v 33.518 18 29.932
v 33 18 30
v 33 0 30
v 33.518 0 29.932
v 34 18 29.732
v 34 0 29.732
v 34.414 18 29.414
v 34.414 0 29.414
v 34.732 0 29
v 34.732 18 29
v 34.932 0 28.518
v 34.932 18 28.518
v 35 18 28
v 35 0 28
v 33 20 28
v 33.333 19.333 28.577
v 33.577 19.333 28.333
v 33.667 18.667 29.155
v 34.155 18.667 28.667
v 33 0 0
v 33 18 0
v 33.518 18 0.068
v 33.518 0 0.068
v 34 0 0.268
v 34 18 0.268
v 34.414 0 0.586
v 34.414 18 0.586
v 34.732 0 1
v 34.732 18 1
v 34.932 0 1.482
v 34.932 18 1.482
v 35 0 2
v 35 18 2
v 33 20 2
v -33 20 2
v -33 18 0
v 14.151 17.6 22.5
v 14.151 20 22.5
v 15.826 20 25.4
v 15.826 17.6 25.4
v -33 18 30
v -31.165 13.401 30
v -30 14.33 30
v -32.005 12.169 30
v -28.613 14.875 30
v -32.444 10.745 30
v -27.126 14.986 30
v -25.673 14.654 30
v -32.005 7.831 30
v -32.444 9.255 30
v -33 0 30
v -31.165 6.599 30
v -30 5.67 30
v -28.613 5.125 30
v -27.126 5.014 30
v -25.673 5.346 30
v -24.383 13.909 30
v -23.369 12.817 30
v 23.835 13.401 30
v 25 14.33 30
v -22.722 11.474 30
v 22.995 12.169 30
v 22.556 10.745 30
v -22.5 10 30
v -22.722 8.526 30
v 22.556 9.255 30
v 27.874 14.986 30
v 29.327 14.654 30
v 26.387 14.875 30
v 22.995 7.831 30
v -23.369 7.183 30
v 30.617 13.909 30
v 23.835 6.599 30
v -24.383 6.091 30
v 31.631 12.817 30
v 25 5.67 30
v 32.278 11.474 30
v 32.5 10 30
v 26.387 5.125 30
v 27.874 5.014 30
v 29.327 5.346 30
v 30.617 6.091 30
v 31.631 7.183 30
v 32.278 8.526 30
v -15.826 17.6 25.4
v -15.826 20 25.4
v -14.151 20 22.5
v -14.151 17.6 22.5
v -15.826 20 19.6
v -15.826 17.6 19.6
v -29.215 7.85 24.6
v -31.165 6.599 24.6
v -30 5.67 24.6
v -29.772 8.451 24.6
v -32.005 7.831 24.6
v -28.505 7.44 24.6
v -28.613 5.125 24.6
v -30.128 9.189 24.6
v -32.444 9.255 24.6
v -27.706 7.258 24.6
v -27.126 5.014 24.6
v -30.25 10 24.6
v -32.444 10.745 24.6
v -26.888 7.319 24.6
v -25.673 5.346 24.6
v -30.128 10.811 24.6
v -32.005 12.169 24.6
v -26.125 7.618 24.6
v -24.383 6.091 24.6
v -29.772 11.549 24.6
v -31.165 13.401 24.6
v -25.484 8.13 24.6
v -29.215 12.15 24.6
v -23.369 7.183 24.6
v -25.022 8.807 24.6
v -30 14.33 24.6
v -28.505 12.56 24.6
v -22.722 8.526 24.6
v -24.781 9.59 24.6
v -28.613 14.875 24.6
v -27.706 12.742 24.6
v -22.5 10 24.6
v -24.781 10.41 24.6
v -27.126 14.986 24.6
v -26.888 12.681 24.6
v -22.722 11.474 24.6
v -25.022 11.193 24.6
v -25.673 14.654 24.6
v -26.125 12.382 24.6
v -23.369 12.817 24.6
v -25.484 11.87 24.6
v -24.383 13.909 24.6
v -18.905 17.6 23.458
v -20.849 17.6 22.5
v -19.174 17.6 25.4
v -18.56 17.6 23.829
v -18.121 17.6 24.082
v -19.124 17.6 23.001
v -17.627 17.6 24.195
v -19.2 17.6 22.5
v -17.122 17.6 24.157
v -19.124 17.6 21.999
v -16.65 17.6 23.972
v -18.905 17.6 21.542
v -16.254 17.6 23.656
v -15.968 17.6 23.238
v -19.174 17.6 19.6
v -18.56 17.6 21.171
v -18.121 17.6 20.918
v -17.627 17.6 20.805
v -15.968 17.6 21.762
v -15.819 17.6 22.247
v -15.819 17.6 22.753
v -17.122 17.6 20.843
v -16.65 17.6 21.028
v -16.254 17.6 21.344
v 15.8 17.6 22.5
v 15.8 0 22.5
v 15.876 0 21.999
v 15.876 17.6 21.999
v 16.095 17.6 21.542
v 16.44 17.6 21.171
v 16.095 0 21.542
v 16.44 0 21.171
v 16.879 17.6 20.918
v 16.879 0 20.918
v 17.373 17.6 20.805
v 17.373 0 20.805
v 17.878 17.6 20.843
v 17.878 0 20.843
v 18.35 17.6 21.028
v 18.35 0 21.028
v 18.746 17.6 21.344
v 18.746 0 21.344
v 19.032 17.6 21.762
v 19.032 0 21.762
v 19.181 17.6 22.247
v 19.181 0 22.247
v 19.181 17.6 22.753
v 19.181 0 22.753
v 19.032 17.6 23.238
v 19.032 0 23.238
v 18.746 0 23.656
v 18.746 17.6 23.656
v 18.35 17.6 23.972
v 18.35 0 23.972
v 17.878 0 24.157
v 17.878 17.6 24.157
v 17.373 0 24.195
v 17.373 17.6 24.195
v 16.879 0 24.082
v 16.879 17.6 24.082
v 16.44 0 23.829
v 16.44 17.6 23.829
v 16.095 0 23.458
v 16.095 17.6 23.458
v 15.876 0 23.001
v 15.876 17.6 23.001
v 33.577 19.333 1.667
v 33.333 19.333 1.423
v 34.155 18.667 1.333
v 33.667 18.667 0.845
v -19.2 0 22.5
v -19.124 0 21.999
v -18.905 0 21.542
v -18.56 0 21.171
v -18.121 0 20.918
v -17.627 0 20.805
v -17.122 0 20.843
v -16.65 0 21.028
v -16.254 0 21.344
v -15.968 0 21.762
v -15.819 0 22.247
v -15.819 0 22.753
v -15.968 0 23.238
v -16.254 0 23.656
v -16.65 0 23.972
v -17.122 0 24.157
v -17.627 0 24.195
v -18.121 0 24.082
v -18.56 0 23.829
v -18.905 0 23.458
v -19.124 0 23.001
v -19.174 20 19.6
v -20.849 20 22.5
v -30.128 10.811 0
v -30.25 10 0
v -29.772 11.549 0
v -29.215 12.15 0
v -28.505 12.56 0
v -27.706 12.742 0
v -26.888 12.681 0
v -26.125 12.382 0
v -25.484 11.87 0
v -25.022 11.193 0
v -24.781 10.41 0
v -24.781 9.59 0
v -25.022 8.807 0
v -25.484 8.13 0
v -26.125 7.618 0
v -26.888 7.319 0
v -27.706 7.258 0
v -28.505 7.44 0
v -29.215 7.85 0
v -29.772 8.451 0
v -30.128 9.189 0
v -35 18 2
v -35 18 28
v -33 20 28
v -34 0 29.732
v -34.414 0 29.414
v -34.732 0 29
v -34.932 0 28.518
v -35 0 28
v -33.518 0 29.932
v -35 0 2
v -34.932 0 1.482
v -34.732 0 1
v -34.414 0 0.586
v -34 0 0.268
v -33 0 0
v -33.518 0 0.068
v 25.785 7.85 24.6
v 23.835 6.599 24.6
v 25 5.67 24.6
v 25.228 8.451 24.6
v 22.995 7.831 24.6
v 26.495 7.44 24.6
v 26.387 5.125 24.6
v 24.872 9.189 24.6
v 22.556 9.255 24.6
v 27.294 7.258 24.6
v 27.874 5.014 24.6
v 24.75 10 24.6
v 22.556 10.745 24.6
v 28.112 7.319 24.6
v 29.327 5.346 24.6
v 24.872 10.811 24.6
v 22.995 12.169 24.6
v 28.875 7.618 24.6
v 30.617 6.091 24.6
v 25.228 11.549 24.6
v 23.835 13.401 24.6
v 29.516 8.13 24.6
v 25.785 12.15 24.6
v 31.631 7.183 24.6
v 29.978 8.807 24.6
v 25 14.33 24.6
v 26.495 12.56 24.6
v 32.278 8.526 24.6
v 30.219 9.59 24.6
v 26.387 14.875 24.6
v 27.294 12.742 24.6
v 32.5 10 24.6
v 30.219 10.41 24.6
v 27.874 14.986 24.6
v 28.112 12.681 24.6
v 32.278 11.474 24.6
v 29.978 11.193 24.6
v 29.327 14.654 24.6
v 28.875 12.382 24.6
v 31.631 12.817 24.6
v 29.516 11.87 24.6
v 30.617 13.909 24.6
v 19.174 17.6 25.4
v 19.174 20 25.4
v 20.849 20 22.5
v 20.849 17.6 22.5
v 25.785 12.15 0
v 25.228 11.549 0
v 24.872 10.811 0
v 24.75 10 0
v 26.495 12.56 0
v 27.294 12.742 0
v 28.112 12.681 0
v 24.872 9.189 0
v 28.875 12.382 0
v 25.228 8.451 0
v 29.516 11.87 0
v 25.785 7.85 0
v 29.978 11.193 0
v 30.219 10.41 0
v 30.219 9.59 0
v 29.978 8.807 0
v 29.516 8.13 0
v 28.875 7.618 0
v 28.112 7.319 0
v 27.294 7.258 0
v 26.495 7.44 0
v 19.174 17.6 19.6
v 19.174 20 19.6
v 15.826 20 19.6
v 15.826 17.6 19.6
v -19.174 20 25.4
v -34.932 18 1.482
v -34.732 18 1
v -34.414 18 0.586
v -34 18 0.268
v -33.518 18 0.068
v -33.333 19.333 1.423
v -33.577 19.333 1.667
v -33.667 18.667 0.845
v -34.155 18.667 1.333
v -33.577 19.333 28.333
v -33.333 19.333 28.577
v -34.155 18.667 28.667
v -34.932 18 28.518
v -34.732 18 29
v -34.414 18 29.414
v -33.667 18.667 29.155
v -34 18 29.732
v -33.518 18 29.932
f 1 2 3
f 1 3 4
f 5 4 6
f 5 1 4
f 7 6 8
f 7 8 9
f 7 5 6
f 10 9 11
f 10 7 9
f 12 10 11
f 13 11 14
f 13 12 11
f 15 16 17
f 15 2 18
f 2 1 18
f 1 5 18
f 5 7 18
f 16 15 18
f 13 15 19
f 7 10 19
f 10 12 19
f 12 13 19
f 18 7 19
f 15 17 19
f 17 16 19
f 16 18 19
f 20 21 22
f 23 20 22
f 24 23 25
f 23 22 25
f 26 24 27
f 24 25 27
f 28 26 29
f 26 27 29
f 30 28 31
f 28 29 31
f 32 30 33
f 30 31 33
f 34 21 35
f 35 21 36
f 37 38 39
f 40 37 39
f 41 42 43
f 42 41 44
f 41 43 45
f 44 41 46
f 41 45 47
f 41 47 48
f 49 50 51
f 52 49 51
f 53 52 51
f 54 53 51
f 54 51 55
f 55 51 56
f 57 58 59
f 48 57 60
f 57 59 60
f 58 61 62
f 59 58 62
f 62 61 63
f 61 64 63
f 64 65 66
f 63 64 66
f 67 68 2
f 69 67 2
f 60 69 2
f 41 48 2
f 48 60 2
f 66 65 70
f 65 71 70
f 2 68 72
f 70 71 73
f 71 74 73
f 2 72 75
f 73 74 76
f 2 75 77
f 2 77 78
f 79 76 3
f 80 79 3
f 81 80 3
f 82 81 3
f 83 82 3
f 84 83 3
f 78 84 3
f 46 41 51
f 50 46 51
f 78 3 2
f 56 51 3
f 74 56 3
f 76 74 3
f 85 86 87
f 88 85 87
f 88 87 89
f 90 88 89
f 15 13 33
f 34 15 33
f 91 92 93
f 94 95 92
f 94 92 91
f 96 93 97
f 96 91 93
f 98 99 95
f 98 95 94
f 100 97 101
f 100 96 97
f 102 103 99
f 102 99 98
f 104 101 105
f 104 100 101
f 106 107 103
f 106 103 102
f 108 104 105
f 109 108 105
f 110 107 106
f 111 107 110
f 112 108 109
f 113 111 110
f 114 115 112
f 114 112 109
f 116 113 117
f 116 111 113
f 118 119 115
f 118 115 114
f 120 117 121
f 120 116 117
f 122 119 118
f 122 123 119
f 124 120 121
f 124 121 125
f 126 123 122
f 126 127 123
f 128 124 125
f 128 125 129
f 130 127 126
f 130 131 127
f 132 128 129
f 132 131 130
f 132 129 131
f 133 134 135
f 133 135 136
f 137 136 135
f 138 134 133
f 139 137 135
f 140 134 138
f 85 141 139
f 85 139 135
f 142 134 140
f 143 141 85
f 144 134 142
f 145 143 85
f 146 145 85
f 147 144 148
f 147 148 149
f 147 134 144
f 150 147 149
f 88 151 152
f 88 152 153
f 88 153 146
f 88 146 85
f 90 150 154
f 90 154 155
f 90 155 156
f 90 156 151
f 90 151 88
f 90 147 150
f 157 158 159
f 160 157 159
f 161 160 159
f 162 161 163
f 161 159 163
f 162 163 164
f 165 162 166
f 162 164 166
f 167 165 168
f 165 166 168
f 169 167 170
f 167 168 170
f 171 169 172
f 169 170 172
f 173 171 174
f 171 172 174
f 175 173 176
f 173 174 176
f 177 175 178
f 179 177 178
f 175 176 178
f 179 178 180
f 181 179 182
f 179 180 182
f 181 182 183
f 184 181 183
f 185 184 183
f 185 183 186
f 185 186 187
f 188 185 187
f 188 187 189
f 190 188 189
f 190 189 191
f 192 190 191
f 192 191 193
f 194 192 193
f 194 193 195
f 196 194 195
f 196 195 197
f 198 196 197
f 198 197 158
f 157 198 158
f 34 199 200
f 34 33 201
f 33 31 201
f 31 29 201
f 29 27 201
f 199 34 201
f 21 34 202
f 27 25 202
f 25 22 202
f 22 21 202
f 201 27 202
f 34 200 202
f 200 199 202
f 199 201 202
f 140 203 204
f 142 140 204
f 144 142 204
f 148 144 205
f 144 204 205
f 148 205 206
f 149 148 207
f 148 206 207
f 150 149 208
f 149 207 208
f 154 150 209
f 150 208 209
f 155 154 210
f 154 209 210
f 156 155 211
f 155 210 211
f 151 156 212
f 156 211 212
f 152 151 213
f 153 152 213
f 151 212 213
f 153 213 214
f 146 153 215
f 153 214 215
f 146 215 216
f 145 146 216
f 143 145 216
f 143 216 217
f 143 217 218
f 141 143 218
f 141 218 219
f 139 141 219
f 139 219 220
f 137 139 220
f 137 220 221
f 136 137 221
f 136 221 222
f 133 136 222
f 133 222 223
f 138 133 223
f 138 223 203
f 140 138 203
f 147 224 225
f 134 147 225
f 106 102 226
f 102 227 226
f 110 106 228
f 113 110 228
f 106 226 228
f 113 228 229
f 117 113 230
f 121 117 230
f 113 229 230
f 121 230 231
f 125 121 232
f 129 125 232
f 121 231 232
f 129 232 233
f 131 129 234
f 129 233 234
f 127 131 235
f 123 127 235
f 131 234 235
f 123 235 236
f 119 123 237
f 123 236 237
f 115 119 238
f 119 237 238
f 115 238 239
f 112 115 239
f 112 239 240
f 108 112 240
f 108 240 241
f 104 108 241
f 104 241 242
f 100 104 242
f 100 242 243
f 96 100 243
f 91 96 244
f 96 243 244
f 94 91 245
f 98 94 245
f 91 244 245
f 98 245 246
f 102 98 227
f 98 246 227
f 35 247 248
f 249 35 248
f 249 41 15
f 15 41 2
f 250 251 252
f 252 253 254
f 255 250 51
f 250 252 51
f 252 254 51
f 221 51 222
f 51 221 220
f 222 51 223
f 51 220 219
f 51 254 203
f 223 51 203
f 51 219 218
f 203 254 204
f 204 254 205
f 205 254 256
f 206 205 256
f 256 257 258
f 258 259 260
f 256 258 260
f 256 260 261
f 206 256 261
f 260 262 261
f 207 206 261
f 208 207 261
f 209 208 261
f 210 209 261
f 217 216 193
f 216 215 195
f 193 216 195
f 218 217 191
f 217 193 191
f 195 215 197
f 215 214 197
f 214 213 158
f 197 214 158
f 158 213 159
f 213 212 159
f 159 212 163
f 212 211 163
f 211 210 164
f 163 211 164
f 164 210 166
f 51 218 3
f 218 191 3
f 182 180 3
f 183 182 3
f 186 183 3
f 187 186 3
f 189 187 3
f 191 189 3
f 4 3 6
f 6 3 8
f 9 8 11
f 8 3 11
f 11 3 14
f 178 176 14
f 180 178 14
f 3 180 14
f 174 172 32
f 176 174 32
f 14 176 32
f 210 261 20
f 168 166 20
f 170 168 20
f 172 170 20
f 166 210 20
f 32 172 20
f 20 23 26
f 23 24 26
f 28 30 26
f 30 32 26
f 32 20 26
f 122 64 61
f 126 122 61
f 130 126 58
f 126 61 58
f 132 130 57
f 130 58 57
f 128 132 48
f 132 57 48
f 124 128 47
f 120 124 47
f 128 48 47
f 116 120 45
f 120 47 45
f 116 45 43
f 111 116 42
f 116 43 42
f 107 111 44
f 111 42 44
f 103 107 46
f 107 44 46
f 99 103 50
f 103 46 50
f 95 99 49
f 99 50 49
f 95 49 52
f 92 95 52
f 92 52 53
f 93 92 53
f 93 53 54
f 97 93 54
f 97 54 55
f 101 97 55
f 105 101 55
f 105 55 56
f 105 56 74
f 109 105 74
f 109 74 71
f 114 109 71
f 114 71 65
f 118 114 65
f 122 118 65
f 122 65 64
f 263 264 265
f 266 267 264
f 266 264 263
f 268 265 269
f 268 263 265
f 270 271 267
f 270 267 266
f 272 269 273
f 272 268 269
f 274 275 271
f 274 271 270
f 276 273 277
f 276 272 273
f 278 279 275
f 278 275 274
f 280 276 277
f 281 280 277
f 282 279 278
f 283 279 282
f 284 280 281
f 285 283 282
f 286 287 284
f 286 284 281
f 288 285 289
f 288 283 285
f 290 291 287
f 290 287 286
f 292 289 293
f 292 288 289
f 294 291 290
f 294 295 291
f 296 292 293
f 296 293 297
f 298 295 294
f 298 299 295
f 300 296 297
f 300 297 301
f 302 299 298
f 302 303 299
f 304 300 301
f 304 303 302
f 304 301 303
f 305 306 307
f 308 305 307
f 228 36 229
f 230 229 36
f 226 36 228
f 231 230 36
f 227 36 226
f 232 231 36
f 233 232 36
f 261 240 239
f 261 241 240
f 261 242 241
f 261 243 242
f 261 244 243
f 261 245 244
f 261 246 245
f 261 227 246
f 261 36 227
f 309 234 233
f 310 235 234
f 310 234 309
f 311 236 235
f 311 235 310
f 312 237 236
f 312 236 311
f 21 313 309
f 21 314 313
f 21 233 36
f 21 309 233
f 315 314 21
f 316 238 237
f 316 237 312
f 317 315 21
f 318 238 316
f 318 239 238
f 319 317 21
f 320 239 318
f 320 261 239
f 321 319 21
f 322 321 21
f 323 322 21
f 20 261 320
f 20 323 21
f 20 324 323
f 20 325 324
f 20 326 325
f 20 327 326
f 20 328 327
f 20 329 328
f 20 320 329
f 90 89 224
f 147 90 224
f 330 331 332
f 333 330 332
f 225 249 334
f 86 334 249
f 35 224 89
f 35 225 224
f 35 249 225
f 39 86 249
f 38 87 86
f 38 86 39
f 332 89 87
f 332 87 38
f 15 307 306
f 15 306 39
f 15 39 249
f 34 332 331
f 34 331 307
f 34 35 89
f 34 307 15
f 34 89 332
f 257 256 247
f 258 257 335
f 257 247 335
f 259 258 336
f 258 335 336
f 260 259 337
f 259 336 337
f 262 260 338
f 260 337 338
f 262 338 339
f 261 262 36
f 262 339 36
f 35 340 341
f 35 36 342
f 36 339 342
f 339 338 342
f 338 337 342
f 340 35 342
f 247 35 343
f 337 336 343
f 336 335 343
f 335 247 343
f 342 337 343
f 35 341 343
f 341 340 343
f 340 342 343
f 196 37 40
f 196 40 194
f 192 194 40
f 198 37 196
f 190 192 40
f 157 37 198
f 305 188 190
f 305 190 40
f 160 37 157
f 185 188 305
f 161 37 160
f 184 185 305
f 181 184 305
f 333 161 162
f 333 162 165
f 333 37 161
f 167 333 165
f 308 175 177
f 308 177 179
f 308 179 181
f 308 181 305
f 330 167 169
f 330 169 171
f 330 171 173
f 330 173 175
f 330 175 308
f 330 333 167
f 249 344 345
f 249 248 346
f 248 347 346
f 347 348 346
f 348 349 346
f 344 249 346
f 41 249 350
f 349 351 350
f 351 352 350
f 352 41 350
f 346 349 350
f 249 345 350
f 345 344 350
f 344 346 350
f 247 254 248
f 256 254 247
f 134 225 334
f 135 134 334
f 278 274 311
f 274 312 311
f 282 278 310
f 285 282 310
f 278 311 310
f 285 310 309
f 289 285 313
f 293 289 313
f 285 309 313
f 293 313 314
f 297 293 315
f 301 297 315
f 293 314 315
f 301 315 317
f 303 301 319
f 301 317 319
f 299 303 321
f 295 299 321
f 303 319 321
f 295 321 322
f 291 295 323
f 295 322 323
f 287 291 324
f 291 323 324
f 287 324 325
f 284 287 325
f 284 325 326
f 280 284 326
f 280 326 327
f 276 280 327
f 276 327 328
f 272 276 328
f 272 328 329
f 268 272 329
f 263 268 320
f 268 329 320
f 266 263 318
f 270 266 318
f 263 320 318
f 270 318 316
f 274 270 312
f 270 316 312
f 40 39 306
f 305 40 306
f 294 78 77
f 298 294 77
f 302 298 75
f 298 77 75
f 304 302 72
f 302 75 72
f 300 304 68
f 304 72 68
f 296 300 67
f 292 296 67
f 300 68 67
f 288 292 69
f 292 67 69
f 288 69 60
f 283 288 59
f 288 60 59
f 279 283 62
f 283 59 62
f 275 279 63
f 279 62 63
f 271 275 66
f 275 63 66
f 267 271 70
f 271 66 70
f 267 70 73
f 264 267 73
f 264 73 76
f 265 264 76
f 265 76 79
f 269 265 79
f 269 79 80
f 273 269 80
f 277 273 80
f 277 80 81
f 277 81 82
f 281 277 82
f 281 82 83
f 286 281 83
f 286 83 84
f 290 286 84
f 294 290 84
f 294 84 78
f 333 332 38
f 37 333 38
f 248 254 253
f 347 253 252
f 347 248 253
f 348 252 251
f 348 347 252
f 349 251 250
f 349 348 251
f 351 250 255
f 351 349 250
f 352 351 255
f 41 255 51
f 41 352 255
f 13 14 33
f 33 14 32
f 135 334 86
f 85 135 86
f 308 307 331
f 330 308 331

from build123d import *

# Parameters (mm, degrees)
MAIN_BLOCK_SKETCH_W                                 = 70
MAIN_BLOCK_SKETCH_H                                 = 30
MAIN_BLOCK_DEPTH                                    = 20
NUT_TRAPS_DEPTH                                     = 2.4
TENSION_SCREW_HOLES_D                               = 3.4
CBORE_FOR_M5_HEX_SOCKET_HEAD_CAP_SCREW1_D           = 5.5
CBORE_FOR_M5_HEX_SOCKET_HEAD_CAP_SCREW1_CBORE_D     = 10
CBORE_FOR_M5_HEX_SOCKET_HEAD_CAP_SCREW1_CBORE_DEPTH = 5.4
PRINT_HELPER_FILLETS_R                              = 2
COSMETIC_CHAMFER_SIZE                               = 2


with BuildPart() as part:
    # Main Block Sketch → Main Block (new body)
    with BuildSketch(Plane(origin=(0, 0, 0), x_dir=(1, 0, 0), z_dir=(0, 1, 0))):
        with Locations((0, -15)):
            Rectangle(MAIN_BLOCK_SKETCH_W, MAIN_BLOCK_SKETCH_H)
    extrude(amount=MAIN_BLOCK_DEPTH)

    # Nut TrapsSketch → Nut Traps (cut)
    with BuildSketch(Plane(origin=(0, 20, 0), x_dir=(1, 0, 0), z_dir=(0, 1, 0))):
        Polygon((-15.825684219, -19.6), (-19.174315781, -19.6), (-20.848631561, -22.5), (-19.174315781, -25.4), (-15.825684219, -25.4), (-14.151368439, -22.5), align=None)
        Polygon((19.174315781, -19.6), (15.825684219, -19.6), (14.151368439, -22.5), (15.825684219, -25.4), (19.174315781, -25.4), (20.848631561, -22.5), align=None)
    extrude(amount=-NUT_TRAPS_DEPTH, mode=Mode.SUBTRACT)

    # Tension Screw Holes (through all)
    with Locations(Plane(origin=(0, 20, 0), x_dir=(1, 0, 0), z_dir=(0, 1, 0))):
        with Locations((-17.5, -22.5), (17.5, -22.5)):
            Hole(TENSION_SCREW_HOLES_D / 2)

    # CBORE for M5 Hex Socket Head Cap Screw1 (through all)
    with Locations(Plane.XY.offset(30)):
        with Locations((-27.5, 10), (27.5, 10)):
            CounterBoreHole(CBORE_FOR_M5_HEX_SOCKET_HEAD_CAP_SCREW1_D / 2, CBORE_FOR_M5_HEX_SOCKET_HEAD_CAP_SCREW1_CBORE_D / 2, CBORE_FOR_M5_HEX_SOCKET_HEAD_CAP_SCREW1_CBORE_DEPTH)

    # Print Helper Fillets
    print_helper_fillets_edges = [part.edges().sort_by_distance(p)[0] for p in [
        (35, 10, 30),
        (35, 10, 0),
        (-35, 10, 0),
        (-35, 10, 30),
    ]]
    fillet(print_helper_fillets_edges, radius=PRINT_HELPER_FILLETS_R)

    # Cosmetic Chamfer
    cosmetic_chamfer_edges = [part.edges().sort_by_distance(p)[0] for p in [
        (35, 20, 15),
        (0, 20, 30),
        (0, 20, 0),
        (-35, 20, 15),
        (-34.414213562, 20, 29.414213562),
        (-34.414213562, 20, 0.585786438),
        (34.414213562, 20, 0.585786438),
        (34.414213562, 20, 29.414213562),
    ]]
    chamfer(cosmetic_chamfer_edges, length=COSMETIC_CHAMFER_SIZE)


solid = part.part
